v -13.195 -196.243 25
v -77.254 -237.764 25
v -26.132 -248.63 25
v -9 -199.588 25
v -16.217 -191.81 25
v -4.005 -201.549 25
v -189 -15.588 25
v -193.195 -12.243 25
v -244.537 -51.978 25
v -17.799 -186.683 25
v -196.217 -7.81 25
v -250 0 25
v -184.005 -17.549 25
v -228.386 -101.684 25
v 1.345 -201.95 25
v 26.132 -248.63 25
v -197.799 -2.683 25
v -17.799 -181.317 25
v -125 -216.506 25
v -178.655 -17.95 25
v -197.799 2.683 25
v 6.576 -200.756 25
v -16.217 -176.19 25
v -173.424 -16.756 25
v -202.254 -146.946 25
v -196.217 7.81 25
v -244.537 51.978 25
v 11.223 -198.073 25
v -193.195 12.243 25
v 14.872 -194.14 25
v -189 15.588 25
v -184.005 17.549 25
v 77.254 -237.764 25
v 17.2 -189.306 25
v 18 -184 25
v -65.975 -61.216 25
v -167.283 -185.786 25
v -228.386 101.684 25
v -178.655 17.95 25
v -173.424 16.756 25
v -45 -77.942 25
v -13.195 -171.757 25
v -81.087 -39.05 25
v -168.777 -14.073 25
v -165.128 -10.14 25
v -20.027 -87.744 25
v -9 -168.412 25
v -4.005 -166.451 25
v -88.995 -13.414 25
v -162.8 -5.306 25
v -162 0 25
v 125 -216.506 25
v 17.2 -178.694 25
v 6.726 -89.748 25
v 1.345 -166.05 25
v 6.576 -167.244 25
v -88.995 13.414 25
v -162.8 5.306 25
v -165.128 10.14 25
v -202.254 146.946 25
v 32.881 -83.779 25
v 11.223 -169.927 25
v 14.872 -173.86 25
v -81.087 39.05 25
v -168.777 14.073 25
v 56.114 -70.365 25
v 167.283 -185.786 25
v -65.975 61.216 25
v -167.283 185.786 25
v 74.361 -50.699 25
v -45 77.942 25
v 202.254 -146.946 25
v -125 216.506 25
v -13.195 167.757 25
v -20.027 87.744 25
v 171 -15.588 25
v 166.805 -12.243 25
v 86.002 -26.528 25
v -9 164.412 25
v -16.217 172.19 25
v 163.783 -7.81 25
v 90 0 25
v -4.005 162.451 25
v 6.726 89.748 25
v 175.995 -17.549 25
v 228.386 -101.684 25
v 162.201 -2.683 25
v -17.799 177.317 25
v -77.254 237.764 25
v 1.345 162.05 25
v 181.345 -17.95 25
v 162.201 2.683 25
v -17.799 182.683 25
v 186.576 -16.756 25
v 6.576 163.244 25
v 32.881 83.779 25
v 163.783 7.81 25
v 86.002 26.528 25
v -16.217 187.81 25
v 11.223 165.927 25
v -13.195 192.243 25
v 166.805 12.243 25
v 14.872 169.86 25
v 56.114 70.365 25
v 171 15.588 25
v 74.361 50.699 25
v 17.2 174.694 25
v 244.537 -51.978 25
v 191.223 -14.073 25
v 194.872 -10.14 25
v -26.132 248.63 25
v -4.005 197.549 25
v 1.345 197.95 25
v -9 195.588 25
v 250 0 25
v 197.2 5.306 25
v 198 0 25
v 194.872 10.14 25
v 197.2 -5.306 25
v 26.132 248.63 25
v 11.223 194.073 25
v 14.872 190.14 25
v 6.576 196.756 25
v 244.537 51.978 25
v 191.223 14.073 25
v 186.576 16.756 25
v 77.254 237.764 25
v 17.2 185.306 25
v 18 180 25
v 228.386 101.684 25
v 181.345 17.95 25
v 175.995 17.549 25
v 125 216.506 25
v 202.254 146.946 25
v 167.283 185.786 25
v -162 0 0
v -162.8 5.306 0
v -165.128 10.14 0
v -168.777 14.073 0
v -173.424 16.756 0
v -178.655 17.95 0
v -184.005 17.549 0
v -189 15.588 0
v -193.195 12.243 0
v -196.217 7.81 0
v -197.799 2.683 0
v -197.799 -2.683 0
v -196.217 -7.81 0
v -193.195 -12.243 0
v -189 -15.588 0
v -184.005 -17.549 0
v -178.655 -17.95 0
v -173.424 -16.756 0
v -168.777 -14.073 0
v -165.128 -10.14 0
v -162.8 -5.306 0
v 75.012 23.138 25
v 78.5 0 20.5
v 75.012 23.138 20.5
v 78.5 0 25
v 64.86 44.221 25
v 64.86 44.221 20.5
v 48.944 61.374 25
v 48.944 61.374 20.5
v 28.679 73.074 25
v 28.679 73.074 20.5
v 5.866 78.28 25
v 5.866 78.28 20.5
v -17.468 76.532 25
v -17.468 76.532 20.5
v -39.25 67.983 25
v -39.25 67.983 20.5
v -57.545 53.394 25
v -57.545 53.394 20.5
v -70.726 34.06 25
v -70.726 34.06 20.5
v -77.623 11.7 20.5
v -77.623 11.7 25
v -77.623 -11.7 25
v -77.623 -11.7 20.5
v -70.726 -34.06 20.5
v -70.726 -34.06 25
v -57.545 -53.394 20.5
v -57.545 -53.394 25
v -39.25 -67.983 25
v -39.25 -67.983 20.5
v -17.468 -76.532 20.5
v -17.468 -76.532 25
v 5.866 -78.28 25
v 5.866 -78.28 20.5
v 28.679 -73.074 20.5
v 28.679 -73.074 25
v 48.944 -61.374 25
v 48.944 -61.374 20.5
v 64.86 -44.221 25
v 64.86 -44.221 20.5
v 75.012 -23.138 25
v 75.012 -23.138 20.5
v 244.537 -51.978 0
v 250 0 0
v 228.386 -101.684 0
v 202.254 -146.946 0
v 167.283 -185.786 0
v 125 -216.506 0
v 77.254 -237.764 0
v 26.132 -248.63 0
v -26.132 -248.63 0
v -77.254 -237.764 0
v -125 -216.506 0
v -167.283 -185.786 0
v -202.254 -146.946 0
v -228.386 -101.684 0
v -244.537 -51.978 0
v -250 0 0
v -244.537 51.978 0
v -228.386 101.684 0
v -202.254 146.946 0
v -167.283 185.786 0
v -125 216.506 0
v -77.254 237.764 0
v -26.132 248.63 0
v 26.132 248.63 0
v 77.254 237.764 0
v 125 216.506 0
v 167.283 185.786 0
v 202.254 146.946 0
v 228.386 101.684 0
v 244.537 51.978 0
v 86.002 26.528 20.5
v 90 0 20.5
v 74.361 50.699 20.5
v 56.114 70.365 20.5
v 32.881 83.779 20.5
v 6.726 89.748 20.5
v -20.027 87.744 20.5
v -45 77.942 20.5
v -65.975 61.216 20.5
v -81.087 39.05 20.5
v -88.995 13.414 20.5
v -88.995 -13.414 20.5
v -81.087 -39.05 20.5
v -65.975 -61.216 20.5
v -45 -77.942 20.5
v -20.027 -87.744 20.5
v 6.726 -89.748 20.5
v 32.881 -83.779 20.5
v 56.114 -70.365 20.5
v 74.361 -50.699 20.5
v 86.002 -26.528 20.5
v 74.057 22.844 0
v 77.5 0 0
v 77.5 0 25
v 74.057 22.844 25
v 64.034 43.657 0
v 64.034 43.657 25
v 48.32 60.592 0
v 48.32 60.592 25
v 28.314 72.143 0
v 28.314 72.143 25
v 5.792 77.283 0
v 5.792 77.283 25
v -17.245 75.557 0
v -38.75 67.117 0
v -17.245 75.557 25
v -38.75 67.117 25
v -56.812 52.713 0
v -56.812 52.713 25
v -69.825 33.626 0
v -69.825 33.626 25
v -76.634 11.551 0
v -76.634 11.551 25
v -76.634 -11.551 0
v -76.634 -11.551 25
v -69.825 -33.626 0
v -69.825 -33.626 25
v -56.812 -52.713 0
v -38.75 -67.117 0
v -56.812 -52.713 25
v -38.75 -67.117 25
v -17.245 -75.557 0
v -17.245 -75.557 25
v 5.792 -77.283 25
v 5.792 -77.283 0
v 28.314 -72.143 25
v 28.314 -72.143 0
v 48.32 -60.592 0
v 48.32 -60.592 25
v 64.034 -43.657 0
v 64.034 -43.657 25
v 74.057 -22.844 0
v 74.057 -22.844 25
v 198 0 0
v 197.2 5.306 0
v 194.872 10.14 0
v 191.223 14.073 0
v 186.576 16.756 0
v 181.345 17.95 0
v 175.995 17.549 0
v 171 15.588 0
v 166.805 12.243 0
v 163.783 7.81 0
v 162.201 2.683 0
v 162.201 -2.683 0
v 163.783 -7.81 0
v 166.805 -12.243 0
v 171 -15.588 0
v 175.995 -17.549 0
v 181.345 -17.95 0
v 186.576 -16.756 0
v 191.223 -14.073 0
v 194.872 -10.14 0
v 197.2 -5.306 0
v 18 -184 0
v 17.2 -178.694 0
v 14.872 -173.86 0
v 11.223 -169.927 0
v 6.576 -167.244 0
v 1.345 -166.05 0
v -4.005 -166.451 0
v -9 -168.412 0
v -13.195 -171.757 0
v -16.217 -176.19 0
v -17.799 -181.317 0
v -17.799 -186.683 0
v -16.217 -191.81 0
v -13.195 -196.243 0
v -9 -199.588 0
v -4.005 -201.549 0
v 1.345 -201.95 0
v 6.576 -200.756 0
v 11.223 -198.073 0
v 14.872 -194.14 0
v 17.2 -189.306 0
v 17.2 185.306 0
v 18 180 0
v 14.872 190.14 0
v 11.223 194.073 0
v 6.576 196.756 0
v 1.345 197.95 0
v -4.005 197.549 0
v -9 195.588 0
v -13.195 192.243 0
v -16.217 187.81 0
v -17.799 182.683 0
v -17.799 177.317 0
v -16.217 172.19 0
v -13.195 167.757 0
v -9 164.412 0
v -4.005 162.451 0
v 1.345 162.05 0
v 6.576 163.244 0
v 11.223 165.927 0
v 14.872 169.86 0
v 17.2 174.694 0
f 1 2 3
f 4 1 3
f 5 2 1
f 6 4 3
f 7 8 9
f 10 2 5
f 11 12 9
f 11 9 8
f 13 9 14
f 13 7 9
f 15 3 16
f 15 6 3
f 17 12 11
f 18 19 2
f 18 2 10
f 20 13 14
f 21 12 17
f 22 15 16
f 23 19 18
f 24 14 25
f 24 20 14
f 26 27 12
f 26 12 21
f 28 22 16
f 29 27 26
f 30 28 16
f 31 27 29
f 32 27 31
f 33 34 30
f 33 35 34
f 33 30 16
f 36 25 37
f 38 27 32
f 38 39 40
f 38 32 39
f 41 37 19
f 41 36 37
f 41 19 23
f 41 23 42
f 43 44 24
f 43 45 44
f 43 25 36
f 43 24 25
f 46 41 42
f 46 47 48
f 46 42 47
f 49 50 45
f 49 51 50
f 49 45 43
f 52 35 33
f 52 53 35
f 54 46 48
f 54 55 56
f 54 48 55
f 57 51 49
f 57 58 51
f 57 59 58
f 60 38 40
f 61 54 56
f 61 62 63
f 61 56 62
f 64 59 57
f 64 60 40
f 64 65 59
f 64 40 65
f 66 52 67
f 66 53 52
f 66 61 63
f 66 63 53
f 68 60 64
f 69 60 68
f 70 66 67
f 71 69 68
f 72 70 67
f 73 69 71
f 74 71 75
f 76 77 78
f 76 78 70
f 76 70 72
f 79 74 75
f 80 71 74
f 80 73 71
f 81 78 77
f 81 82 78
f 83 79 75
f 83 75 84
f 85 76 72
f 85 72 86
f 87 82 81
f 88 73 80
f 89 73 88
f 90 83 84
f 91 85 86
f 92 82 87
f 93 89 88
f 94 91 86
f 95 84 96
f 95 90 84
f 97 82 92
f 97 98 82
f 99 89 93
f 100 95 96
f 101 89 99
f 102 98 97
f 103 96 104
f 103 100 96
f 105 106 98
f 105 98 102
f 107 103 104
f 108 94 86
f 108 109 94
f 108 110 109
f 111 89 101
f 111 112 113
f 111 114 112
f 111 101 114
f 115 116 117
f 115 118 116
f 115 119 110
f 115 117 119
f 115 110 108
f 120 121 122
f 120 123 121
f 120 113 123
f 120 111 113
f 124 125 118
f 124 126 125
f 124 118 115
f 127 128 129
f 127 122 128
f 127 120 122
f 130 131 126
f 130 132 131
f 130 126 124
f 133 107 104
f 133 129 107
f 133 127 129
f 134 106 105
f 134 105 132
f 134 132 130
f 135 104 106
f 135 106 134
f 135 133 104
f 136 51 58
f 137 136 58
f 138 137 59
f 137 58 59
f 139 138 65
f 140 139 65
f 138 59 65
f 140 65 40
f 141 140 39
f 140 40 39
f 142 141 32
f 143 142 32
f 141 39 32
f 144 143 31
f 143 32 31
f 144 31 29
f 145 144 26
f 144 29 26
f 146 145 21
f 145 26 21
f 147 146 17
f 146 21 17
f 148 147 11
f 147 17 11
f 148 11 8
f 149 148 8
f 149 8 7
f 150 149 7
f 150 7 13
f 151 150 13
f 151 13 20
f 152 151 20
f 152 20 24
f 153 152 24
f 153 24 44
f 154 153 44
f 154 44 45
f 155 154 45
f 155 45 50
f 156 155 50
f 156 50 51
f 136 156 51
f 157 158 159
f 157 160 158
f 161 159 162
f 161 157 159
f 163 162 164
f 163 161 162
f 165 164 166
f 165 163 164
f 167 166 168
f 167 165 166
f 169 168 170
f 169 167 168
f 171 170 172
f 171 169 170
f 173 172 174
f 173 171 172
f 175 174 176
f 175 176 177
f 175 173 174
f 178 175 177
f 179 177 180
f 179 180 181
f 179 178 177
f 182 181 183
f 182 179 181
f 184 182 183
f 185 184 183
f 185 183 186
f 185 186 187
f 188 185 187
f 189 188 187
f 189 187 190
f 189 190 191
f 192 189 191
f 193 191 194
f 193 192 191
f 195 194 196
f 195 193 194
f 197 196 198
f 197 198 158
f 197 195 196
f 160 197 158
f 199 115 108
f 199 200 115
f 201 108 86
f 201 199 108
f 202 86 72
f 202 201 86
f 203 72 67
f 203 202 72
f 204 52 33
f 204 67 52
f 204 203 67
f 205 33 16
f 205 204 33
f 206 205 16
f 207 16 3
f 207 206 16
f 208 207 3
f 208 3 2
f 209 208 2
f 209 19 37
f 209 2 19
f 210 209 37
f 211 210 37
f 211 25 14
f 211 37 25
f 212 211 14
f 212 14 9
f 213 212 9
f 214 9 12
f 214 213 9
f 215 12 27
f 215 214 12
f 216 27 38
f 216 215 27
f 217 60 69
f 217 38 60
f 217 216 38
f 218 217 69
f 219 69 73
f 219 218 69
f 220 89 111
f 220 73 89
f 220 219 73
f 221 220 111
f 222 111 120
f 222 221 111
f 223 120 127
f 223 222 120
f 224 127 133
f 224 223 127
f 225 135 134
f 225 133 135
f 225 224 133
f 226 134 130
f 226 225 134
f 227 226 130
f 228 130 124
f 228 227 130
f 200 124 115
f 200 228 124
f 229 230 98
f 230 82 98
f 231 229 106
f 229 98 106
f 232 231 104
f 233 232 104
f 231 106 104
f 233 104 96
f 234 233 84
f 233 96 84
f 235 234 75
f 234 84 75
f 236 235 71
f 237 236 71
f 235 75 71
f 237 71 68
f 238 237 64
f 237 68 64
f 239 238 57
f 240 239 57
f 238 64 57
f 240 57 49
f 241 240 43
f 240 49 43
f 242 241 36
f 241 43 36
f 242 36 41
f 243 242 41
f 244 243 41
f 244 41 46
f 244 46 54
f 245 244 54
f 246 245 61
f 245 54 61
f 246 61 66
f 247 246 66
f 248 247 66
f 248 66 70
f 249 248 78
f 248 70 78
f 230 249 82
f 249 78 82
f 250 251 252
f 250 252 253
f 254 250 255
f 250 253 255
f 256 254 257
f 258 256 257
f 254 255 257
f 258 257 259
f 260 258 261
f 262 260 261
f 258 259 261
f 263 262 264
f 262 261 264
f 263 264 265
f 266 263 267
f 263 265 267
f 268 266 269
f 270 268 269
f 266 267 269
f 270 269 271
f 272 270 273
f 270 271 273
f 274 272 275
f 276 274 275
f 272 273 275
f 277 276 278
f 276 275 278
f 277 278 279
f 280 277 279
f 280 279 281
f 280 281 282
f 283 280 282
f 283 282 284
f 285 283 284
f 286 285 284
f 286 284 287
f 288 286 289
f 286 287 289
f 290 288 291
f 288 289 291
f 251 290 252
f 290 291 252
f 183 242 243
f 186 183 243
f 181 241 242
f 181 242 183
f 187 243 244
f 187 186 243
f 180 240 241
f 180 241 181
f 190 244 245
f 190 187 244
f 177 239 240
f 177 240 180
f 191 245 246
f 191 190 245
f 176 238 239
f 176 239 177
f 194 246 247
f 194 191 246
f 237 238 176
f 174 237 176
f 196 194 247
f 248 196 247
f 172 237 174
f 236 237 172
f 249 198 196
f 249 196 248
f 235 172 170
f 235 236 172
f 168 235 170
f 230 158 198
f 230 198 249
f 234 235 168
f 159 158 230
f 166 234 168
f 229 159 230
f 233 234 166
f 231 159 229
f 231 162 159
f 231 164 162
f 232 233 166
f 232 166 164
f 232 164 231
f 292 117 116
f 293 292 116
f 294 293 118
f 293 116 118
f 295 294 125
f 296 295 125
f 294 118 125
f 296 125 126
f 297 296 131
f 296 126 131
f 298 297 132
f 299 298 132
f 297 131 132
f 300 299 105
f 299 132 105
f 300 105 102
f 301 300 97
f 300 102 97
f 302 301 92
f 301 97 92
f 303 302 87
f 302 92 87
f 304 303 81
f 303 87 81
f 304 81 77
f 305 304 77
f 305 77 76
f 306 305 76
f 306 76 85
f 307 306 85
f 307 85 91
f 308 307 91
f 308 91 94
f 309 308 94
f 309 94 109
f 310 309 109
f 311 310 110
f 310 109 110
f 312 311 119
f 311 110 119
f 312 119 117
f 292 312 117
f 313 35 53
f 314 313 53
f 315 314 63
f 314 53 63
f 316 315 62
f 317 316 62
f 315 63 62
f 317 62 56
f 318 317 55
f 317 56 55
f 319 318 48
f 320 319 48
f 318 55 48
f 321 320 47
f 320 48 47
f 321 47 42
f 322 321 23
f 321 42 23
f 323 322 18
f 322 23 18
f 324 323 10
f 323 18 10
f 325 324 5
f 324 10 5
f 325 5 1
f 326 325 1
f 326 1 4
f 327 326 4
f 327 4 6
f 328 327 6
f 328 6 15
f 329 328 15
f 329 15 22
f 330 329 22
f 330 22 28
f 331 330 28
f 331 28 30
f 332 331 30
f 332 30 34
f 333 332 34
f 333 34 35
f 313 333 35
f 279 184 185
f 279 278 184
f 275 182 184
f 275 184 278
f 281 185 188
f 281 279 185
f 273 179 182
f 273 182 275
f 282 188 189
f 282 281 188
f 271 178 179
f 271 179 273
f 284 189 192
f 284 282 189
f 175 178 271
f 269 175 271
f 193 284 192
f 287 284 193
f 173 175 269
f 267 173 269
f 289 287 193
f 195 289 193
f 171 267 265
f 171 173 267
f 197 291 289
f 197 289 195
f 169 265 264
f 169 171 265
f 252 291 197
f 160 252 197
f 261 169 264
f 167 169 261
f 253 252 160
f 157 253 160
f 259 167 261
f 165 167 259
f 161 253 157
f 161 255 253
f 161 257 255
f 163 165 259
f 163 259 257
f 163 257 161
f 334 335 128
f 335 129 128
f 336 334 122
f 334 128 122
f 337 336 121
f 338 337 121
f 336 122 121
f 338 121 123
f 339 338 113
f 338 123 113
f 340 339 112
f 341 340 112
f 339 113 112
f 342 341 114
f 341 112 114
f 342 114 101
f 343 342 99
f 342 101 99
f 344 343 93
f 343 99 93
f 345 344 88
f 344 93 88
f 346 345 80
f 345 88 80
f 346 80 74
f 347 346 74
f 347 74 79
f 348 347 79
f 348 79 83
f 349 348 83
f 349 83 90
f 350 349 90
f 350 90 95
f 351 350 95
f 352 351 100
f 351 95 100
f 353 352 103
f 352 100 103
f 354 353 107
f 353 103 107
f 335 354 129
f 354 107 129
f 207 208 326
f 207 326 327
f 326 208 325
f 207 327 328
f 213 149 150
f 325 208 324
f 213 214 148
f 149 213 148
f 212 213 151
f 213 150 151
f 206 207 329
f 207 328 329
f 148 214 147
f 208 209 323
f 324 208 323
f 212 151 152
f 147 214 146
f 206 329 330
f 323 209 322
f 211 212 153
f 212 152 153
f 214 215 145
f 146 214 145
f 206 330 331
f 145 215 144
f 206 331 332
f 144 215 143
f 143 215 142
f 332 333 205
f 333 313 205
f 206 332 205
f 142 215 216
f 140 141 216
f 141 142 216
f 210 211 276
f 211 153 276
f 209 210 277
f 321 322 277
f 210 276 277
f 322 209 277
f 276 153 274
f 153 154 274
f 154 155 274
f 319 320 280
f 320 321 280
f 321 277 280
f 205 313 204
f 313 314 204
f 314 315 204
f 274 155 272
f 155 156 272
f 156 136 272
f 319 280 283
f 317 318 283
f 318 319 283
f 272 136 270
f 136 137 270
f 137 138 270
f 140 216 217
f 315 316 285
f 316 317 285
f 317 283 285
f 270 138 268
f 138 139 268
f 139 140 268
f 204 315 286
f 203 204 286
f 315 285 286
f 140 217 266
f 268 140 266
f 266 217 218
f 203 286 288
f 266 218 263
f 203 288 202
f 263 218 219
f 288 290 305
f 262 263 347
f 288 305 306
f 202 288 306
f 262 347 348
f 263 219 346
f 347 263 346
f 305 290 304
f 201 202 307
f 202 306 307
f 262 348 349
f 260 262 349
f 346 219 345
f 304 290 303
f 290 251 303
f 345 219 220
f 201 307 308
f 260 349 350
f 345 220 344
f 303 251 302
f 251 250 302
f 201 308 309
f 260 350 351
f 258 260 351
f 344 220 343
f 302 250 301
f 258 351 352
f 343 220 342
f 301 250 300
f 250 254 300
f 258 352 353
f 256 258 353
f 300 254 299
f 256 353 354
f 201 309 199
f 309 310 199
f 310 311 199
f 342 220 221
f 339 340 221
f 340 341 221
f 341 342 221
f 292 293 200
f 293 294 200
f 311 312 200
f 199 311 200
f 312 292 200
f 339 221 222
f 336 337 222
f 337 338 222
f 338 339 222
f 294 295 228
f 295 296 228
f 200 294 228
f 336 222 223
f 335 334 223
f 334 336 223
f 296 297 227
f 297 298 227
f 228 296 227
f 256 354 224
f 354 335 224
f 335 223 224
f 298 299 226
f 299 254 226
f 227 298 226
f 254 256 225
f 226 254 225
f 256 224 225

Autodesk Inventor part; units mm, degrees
ref_plane "YZ Plane" through (0, 0, 0) normal (1, 0, 0) x (0, 1, 0)
ref_plane "XZ Plane" through (0, 0, 0) normal (0, 1, 0) x (-1, 0, 0)
ref_plane "XY Plane" through (0, 0, 0) normal (0, 0, 1) x (1, 0, 0)
sketch "Szkic1" plane through (0, 0, 0) normal (0, 0, 1) x (1, 0, 0)
  circle A0 centre (0, 0) radius 250
  dimension "d0" = 500
extrude "Wyciągnięcie proste1" add sketch "Szkic1" along normal blind 25
sketch "Szkic2" plane through (0, 0, 25) normal (0, 0, 1) x (1, 0, 0)
  circle A0 centre (0, 180) radius 18
  circle A1 centre (180, 0) radius 18
  circle A2 centre (0, -184) radius 18
  circle A3 centre (-180, 0) radius 18
  point P0 (0, 0)
  dimension "d3" = 36
  dimension "d4" = 36
  dimension "d5" = 36
  dimension "d6" = 36
extrude "Wyciągnięcie proste2" cut sketch "Szkic2" against normal blind 25
thread "Gwint1" size "M36x4" class "6H" standard "ANSI Metric M Profile" full length
thread "Gwint2" size "M36x4" class "6H" standard "ANSI Metric M Profile" full length
thread "Gwint3" size "M36x4" class "6H" standard "ANSI Metric M Profile" full length
thread "Gwint4" size "M36x4" class "6H" standard "ANSI Metric M Profile" full length
sketch "Szkic3" plane through (0, 0, 25) normal (0, 0, 1) x (1, 0, 0)
  circle A0 centre (0, 0) radius 85
  dimension "d17" = 170
extrude "Wyciągnięcie proste3" cut sketch "Szkic3" against normal blind 200
sketch "Szkic4" plane through (0, 0, 25) normal (0, 0, 1) x (1, 0, 0)
  circle A0 centre (0, 0) radius 77.5
  dimension "d20" = 155
sketch "Szkic5" plane through (0, 0, 25) normal (0, 0, 1) x (1, 0, 0)
  circle A0 centre (0, 0) radius 85
  dimension "d21" = 170
extrude "Wyciągnięcie proste4" add sketch "Szkic5" against normal blind 25
extrude "Wyciągnięcie proste5" cut sketch "Szkic4" against normal blind 25
sketch "Szkic6" plane through (0, 0, 25) normal (0, 0, 1) x (1, 0, 0)
  circle A0 centre (0, 0) radius 82
  circle A1 centre (0, 0) radius 87
  dimension "d26" = 164
  dimension "d27" = 174
extrude "Wyciągnięcie proste6" cut sketch "Szkic6" against normal blind 4.5
sketch "Szkic7" plane through (0, 0, 25) normal (0, 0, 1) x (1, 0, 0)
  circle A0 centre (0, 0) radius 79.5
  circle A1 centre (0, 0) radius 84.5
  dimension "d30" = 159
  dimension "d31" = 169
extrude "Wyciągnięcie proste7" cut sketch "Szkic7" against normal blind 4.5
sketch "Szkic8" plane through (0, 0, 25) normal (0, 0, 1) x (1, 0, 0)
  circle A0 centre (0, 0) radius 78.5
  circle A1 centre (0, 0) radius 90
  dimension "d34" = 157
  dimension "d36" = 180
extrude "Wyciągnięcie proste8" cut sketch "Szkic8" against normal blind 4.5
properties part number "pięćśetka"
